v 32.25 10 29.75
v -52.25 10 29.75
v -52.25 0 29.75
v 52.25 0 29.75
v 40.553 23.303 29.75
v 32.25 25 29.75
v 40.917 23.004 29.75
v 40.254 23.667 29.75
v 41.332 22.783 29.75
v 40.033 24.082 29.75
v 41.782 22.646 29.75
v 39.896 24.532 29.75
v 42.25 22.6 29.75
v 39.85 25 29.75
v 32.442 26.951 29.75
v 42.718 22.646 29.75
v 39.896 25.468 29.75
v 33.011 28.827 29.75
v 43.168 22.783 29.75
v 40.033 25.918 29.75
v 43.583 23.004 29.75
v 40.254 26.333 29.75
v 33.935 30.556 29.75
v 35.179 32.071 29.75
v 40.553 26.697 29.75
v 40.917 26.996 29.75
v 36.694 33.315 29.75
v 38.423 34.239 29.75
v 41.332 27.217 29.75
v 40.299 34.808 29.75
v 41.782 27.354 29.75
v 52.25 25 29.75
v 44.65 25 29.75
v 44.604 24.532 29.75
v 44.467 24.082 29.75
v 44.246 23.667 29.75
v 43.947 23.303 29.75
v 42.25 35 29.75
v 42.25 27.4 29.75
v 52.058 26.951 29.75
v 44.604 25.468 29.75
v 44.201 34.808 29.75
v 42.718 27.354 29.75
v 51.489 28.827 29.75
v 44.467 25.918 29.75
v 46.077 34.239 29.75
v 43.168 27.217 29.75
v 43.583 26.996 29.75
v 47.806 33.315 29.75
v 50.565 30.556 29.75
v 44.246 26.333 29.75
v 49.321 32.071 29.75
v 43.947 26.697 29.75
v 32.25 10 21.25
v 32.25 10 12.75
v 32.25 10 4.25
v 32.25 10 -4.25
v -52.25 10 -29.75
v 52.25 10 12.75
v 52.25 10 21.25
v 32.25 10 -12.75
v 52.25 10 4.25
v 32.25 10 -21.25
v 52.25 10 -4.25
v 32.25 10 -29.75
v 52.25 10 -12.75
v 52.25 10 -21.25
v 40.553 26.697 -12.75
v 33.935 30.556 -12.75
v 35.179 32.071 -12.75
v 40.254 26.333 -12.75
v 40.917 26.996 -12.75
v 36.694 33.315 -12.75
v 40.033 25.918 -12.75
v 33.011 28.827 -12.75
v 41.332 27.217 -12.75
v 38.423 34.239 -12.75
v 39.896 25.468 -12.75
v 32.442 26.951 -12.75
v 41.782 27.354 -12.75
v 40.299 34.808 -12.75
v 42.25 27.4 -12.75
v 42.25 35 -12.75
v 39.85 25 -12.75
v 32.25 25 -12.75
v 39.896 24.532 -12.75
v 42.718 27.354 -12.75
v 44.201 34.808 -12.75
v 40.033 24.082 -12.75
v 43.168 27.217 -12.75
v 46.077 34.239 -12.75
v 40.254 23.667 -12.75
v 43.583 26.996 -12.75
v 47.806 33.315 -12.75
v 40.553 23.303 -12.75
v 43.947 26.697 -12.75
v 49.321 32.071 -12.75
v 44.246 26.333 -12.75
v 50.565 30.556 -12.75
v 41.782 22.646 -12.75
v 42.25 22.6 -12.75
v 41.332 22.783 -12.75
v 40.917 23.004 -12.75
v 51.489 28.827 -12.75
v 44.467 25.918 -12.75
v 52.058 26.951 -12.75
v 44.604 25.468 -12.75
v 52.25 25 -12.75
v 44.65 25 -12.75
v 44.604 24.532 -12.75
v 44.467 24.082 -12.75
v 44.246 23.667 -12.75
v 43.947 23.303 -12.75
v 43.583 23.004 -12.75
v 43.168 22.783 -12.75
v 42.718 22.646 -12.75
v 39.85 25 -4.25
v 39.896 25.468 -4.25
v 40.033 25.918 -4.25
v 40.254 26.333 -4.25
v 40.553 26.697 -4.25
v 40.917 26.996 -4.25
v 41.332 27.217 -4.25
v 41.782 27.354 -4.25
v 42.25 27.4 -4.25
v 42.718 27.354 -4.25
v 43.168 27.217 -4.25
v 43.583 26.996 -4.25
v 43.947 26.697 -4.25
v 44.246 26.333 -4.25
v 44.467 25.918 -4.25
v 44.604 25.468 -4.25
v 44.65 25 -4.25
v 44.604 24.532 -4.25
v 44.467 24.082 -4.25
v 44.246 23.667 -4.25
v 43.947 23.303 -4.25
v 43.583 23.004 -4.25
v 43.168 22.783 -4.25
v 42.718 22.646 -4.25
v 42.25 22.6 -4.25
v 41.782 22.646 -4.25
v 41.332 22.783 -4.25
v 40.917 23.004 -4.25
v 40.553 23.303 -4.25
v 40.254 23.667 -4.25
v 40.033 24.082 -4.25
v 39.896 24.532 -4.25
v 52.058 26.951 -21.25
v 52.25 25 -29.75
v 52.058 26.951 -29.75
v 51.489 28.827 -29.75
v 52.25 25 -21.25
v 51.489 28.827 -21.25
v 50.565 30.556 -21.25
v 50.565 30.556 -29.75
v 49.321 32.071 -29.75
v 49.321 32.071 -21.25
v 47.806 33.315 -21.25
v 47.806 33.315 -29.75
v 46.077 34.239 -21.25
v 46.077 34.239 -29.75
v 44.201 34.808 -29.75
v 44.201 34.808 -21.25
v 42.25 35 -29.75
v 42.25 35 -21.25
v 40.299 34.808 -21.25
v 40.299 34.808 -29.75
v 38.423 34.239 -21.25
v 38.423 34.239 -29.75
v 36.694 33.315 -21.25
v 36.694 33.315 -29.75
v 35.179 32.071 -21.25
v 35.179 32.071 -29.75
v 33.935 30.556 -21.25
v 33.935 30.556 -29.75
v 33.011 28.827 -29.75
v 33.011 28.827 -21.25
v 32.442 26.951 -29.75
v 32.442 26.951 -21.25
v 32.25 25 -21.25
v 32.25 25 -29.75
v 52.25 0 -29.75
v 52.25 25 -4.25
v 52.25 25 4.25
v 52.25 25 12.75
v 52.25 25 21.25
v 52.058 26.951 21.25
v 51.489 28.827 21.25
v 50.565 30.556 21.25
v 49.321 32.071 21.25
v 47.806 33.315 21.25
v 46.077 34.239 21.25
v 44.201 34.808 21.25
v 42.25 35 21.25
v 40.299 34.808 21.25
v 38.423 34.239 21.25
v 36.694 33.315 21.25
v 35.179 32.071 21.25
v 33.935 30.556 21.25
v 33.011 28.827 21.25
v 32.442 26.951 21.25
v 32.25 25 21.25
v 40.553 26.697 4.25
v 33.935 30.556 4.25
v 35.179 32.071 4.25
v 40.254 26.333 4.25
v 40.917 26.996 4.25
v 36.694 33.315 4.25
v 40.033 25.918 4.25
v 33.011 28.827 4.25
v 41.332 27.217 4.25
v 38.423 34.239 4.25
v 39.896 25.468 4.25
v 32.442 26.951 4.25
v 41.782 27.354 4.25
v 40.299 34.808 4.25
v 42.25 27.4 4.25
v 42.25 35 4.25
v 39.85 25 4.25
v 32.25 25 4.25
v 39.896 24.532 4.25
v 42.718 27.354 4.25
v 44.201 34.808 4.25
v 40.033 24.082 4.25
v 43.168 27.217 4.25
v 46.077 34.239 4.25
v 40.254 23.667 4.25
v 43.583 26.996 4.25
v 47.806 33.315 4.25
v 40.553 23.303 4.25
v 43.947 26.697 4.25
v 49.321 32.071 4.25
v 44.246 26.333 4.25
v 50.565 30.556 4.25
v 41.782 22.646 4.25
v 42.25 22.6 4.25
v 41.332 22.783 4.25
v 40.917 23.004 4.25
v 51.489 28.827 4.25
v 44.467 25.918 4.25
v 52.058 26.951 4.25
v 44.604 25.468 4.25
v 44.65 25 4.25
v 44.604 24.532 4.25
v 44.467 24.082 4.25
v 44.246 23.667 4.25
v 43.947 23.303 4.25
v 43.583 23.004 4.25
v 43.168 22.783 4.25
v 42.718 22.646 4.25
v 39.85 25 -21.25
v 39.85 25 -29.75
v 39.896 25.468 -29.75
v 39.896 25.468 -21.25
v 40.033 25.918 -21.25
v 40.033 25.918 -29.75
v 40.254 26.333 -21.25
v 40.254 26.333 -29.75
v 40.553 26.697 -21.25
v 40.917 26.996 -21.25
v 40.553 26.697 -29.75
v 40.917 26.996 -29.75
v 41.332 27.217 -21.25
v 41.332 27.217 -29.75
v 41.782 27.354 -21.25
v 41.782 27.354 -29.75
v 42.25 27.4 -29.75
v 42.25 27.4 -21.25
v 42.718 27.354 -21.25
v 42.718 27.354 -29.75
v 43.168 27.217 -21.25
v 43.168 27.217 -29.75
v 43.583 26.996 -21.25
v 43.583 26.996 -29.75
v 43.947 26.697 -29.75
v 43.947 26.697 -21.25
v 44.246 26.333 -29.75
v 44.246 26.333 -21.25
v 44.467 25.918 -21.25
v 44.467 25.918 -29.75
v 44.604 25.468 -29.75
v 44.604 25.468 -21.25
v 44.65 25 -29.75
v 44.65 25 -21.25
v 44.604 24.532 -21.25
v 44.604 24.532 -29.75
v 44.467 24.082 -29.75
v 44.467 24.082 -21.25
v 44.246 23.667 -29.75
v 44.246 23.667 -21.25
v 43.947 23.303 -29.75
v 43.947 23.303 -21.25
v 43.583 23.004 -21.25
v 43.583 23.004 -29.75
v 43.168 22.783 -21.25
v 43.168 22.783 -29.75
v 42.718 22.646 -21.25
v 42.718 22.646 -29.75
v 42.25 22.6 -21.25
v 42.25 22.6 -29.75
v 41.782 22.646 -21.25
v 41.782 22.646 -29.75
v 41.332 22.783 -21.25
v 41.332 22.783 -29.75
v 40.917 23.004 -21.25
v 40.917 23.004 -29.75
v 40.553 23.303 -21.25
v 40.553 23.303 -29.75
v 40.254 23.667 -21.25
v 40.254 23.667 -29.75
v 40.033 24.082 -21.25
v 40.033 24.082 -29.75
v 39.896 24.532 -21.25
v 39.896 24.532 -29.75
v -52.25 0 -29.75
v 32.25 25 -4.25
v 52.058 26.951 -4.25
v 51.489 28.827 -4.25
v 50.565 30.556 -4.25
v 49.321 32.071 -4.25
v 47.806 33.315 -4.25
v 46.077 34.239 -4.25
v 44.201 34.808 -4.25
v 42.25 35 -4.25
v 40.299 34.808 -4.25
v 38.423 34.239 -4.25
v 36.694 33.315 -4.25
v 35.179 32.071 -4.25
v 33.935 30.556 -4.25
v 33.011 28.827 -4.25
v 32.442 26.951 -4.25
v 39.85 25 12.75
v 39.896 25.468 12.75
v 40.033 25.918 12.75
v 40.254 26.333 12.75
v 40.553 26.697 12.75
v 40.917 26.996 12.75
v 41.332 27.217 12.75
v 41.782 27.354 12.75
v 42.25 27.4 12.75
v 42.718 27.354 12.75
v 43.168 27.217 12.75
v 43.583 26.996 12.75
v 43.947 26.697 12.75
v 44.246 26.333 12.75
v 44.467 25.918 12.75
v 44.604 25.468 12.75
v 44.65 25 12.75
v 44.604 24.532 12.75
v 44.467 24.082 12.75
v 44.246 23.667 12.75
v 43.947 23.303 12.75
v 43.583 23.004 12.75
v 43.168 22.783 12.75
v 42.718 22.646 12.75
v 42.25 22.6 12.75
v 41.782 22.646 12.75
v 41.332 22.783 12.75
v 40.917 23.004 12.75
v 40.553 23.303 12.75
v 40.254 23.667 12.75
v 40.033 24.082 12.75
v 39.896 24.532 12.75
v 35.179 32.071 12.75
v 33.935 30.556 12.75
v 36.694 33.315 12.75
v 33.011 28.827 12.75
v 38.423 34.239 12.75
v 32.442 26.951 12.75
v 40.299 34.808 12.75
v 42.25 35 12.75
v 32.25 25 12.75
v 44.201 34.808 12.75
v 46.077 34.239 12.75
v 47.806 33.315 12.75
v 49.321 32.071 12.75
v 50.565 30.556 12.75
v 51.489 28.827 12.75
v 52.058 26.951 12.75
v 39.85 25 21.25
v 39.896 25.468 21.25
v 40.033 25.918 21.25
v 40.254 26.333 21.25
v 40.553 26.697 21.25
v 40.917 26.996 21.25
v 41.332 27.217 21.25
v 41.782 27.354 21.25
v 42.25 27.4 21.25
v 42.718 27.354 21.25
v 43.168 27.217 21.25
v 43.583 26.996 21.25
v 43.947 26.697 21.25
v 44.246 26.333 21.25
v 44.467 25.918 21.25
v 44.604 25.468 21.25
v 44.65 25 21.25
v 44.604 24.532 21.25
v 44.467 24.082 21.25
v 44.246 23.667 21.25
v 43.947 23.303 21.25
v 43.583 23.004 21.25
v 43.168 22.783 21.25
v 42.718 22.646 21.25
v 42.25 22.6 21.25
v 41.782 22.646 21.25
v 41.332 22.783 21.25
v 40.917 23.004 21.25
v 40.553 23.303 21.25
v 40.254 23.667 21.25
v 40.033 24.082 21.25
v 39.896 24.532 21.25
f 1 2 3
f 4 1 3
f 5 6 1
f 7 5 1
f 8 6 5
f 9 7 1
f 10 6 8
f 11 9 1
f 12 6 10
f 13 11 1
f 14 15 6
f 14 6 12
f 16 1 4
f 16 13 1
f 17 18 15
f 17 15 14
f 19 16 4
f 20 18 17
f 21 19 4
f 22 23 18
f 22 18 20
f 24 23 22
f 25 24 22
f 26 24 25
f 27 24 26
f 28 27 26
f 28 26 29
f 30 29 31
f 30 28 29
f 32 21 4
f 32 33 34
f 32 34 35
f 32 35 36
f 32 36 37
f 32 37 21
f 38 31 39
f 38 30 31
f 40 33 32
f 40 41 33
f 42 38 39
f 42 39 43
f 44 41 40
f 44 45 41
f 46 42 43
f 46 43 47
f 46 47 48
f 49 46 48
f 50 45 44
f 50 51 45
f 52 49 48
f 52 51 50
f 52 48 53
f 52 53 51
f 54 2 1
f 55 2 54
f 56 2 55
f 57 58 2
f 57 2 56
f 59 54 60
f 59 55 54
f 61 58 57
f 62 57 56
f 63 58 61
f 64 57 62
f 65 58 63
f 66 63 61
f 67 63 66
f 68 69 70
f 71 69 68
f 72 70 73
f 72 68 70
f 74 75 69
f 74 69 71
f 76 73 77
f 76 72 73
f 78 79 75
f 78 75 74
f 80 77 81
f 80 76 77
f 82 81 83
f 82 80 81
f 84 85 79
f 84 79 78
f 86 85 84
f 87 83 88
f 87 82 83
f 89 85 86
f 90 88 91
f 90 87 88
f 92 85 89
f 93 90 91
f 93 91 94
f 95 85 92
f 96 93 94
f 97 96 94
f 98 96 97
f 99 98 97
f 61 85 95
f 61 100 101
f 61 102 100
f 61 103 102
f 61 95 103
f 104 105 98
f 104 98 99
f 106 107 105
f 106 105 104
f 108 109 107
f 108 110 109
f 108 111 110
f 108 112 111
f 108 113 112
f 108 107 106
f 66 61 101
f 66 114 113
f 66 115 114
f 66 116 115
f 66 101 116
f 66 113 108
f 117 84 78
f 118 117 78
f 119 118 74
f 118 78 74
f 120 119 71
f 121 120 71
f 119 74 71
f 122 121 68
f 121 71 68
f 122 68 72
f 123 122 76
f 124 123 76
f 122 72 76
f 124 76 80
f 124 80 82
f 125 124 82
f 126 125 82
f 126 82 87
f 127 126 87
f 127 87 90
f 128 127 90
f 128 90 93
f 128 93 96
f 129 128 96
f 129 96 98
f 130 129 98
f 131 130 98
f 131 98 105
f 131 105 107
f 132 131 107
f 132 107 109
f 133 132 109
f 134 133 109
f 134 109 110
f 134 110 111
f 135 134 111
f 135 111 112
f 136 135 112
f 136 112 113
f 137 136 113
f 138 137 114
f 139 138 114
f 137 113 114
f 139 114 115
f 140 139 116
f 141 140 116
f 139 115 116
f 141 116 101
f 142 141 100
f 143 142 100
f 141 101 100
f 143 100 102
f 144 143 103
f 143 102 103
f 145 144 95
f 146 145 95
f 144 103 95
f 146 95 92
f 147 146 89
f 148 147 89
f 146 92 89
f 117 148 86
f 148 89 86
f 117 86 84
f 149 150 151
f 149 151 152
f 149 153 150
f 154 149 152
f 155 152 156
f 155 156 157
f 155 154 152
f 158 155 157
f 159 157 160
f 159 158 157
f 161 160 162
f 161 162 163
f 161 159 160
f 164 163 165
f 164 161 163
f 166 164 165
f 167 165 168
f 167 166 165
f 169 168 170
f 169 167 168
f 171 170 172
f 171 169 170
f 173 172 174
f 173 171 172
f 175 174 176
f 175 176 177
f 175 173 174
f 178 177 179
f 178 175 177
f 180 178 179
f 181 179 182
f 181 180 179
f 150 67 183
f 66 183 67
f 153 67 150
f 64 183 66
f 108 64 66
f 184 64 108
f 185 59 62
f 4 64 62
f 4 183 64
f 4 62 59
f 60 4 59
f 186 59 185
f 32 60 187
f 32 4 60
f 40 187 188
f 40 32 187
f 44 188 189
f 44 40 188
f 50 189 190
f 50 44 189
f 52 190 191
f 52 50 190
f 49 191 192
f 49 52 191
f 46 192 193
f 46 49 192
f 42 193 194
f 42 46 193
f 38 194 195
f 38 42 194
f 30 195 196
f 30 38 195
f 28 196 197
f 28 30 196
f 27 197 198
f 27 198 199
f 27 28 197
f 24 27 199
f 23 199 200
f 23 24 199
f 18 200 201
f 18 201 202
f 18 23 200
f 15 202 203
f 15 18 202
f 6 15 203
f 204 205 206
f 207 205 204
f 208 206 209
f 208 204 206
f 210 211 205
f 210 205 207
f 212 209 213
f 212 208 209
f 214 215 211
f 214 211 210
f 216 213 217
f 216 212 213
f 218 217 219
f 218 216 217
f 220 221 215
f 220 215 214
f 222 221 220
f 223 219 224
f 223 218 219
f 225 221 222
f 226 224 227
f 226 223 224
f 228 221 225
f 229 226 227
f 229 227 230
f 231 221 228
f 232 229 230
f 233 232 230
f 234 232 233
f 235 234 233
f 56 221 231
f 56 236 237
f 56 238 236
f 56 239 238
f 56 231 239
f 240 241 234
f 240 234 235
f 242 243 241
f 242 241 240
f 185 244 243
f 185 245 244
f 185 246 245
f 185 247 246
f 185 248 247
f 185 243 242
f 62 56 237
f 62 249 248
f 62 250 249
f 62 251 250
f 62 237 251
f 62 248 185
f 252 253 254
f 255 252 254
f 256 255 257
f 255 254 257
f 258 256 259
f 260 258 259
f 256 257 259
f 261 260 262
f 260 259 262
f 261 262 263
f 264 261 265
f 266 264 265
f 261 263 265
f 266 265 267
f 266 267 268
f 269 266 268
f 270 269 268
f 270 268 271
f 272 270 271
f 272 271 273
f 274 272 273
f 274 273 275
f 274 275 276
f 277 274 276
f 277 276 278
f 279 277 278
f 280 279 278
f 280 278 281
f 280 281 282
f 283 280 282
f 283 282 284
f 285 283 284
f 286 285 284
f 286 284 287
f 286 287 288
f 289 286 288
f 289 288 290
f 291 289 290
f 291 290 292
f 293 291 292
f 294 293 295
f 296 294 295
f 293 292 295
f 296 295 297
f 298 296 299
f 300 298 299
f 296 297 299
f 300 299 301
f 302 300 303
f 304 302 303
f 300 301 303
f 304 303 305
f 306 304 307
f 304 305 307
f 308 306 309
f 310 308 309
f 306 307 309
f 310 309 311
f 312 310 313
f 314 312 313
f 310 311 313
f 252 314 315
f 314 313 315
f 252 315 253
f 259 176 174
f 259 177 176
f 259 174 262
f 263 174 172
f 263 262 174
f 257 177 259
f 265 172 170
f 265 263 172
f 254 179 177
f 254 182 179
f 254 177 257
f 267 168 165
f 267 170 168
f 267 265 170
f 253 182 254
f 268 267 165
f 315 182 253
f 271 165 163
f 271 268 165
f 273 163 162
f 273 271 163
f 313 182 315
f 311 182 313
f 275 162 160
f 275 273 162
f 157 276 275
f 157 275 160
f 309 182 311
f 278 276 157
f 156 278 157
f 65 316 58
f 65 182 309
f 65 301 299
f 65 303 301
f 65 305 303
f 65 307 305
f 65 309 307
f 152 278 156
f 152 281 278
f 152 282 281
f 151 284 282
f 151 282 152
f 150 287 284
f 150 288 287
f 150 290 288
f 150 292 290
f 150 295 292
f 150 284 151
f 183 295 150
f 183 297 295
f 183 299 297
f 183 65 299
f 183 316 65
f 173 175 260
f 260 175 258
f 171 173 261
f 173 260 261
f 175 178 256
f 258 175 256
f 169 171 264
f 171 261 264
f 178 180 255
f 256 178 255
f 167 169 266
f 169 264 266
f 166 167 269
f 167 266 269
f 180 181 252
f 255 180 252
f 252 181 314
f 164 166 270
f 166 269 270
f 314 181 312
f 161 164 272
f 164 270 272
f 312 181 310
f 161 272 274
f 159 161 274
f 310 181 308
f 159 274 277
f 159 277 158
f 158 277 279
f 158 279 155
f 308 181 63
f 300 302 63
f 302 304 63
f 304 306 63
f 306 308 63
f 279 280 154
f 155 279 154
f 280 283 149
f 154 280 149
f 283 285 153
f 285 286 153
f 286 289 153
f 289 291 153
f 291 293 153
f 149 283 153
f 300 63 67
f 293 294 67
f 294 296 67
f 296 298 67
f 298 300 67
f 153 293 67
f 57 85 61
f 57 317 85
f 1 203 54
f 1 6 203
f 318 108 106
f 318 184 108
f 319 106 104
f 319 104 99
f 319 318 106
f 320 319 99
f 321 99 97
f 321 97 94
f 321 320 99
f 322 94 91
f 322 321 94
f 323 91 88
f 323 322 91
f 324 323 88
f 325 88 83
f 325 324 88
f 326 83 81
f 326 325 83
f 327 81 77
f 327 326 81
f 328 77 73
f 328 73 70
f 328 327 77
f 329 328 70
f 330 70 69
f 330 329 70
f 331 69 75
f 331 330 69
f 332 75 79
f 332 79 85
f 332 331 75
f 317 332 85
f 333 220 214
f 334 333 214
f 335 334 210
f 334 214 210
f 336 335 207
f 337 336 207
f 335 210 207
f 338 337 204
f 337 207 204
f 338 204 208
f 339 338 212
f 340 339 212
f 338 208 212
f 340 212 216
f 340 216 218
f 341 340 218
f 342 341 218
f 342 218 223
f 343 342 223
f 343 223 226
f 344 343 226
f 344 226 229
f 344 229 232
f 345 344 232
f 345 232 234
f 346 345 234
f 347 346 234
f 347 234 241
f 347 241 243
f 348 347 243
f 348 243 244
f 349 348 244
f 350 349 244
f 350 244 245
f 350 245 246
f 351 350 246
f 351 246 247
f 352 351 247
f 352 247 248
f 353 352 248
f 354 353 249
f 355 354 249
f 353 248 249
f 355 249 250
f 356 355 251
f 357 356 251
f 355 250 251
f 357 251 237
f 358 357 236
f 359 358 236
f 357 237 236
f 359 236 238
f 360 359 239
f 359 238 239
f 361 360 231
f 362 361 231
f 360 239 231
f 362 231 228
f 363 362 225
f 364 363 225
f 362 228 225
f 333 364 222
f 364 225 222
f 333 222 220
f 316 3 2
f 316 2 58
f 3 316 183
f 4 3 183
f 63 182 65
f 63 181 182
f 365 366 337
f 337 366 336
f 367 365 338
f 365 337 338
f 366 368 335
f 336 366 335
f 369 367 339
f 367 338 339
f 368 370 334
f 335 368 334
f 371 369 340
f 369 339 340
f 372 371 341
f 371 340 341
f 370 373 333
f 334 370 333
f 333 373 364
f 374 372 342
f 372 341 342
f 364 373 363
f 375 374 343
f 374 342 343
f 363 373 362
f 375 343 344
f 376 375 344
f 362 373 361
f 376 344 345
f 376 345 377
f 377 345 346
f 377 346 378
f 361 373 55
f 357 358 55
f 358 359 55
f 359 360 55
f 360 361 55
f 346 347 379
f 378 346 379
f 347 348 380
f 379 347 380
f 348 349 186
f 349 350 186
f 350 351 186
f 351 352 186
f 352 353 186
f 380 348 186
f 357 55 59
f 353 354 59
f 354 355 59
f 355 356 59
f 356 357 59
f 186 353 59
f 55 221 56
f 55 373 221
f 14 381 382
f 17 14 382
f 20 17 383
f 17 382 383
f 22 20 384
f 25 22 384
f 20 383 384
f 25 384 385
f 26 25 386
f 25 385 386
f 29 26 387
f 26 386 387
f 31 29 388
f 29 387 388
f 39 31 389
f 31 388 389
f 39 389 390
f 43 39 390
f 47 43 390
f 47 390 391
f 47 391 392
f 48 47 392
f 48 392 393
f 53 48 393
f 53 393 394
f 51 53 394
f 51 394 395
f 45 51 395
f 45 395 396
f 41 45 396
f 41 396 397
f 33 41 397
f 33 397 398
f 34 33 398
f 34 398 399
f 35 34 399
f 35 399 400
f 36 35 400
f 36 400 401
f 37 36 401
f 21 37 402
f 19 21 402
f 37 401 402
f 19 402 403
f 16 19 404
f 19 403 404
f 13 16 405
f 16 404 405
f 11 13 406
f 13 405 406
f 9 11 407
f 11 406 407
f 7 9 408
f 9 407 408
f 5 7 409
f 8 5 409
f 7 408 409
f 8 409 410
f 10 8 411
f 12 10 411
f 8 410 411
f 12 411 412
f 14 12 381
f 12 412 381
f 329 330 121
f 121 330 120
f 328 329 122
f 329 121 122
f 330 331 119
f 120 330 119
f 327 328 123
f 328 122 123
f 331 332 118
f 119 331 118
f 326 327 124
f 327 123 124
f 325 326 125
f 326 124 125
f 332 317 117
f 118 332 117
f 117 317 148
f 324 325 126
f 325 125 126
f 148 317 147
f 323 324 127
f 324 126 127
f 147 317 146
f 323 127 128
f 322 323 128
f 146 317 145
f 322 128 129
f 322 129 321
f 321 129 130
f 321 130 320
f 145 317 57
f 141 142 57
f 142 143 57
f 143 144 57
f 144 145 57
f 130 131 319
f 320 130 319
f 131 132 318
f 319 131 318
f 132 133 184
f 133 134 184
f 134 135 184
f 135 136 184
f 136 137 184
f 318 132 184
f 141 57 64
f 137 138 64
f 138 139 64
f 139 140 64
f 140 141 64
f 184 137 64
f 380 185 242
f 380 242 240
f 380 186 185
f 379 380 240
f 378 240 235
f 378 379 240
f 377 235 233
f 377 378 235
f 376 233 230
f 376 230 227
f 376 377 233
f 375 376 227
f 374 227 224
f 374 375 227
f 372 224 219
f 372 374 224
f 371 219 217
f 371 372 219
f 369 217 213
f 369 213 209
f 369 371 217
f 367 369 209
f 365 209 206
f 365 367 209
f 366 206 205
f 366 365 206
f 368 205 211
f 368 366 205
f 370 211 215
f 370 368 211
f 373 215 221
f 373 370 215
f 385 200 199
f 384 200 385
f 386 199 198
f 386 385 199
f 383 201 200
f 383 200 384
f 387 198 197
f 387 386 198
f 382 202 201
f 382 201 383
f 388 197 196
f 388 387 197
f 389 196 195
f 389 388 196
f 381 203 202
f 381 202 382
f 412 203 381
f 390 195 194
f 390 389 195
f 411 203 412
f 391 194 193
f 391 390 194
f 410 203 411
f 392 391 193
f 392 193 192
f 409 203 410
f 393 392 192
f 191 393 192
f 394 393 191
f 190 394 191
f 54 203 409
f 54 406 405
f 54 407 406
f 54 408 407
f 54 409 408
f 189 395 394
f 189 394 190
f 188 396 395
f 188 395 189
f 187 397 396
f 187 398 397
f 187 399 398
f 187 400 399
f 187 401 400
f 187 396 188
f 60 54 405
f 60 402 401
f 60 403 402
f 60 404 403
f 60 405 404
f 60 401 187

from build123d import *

# Parameters (mm, degrees)
SKETCH1_W                       = 104.5
SKETCH1_H                       = 59.5
BOSS_EXTRUDE1_DEPTH             = 10
BOSS_EXTRUDE2_REACH             = 62.952
BOSS_EXTRUDE2_DIRECTION_2_REACH = 62.952
SKETCH4_W                       = 20
SKETCH4_H                       = 8.5
CUT_EXTRUDE1_DEPTH              = 66.116242213
M4_CLEARANCE_HOLE1_D            = 4.8


with BuildPart() as part:
    # Sketch1 → Boss-Extrude1 (new body)
    with BuildSketch(Plane(origin=(0, 0, 0), x_dir=(1, 0, 0), z_dir=(0, 1, 0))):
        Rectangle(SKETCH1_W, SKETCH1_H)
    extrude(amount=BOSS_EXTRUDE1_DEPTH)

    # Boss-Extrude2: up to this face of the body (flat: up to its plane)
    boss_extrude2_end = Plane(part.part.faces().sort_by_distance((0, 5, 29.75))[0])
    # Sketch3 → Boss-Extrude2 (add, up to the picked face)
    with BuildSketch(Plane.XY, mode=Mode.PRIVATE) as boss_extrude2_sk1:
        with BuildLine():
            Line((52.25, 10), (52.25, 25))
            ThreePointArc((52.25, 25), (42.25, 35), (32.25, 25))
            Line((32.25, 25), (32.25, 10))
            Line((32.25, 10), (52.25, 10))
        make_face()
    boss_extrude2_tool1 = split(extrude(boss_extrude2_sk1.sketch, amount=BOSS_EXTRUDE2_REACH, mode=Mode.PRIVATE), bisect_by=boss_extrude2_end, keep=Keep.BOTH, mode=Mode.PRIVATE)
    add(boss_extrude2_tool1.solids().sort_by(Axis((42.25, 21.535979, 0), (0, 0, 1)))[0])

    # Boss-Extrude2 direction 2: up to this face of the body (flat: up to its plane)
    boss_extrude2_direction_2_end = Plane(part.part.faces().sort_by_distance((0, 5, -29.75))[0])
    # Sketch3 → Boss-Extrude2 direction 2 (add, up to the picked face)
    with BuildSketch(Plane.XY, mode=Mode.PRIVATE) as boss_extrude2_direction_2_sk1:
        with BuildLine():
            Line((52.25, 10), (52.25, 25))
            ThreePointArc((52.25, 25), (42.25, 35), (32.25, 25))
            Line((32.25, 25), (32.25, 10))
            Line((32.25, 10), (52.25, 10))
        make_face()
    boss_extrude2_direction_2_tool1 = split(extrude(boss_extrude2_direction_2_sk1.sketch, amount=-BOSS_EXTRUDE2_DIRECTION_2_REACH, mode=Mode.PRIVATE), bisect_by=boss_extrude2_direction_2_end, keep=Keep.BOTH, mode=Mode.PRIVATE)
    add(boss_extrude2_direction_2_tool1.solids().sort_by(Axis((42.25, 21.535979, 0), (0, 0, -1)))[0])

    # Sketch4 → Cut-Extrude1 (cut, through all)
    with BuildSketch(Plane(origin=(0, 10, 0), x_dir=(1, 0, 0), z_dir=(0, 1, 0))):
        with Locations((42.25, 17)):
            Rectangle(SKETCH4_W, SKETCH4_H)
        with Locations((42.25, 0)):
            Rectangle(SKETCH4_W, SKETCH4_H)
        with Locations((42.25, -17)):
            Rectangle(SKETCH4_W, SKETCH4_H)
    extrude(amount=CUT_EXTRUDE1_DEPTH, mode=Mode.SUBTRACT)

    # M4 Clearance Hole1 (through all)
    with Locations(Plane.XY.offset(29.75)):
        with Locations((42.25, 25)):
            Hole(M4_CLEARANCE_HOLE1_D / 2)


solid = part.part
